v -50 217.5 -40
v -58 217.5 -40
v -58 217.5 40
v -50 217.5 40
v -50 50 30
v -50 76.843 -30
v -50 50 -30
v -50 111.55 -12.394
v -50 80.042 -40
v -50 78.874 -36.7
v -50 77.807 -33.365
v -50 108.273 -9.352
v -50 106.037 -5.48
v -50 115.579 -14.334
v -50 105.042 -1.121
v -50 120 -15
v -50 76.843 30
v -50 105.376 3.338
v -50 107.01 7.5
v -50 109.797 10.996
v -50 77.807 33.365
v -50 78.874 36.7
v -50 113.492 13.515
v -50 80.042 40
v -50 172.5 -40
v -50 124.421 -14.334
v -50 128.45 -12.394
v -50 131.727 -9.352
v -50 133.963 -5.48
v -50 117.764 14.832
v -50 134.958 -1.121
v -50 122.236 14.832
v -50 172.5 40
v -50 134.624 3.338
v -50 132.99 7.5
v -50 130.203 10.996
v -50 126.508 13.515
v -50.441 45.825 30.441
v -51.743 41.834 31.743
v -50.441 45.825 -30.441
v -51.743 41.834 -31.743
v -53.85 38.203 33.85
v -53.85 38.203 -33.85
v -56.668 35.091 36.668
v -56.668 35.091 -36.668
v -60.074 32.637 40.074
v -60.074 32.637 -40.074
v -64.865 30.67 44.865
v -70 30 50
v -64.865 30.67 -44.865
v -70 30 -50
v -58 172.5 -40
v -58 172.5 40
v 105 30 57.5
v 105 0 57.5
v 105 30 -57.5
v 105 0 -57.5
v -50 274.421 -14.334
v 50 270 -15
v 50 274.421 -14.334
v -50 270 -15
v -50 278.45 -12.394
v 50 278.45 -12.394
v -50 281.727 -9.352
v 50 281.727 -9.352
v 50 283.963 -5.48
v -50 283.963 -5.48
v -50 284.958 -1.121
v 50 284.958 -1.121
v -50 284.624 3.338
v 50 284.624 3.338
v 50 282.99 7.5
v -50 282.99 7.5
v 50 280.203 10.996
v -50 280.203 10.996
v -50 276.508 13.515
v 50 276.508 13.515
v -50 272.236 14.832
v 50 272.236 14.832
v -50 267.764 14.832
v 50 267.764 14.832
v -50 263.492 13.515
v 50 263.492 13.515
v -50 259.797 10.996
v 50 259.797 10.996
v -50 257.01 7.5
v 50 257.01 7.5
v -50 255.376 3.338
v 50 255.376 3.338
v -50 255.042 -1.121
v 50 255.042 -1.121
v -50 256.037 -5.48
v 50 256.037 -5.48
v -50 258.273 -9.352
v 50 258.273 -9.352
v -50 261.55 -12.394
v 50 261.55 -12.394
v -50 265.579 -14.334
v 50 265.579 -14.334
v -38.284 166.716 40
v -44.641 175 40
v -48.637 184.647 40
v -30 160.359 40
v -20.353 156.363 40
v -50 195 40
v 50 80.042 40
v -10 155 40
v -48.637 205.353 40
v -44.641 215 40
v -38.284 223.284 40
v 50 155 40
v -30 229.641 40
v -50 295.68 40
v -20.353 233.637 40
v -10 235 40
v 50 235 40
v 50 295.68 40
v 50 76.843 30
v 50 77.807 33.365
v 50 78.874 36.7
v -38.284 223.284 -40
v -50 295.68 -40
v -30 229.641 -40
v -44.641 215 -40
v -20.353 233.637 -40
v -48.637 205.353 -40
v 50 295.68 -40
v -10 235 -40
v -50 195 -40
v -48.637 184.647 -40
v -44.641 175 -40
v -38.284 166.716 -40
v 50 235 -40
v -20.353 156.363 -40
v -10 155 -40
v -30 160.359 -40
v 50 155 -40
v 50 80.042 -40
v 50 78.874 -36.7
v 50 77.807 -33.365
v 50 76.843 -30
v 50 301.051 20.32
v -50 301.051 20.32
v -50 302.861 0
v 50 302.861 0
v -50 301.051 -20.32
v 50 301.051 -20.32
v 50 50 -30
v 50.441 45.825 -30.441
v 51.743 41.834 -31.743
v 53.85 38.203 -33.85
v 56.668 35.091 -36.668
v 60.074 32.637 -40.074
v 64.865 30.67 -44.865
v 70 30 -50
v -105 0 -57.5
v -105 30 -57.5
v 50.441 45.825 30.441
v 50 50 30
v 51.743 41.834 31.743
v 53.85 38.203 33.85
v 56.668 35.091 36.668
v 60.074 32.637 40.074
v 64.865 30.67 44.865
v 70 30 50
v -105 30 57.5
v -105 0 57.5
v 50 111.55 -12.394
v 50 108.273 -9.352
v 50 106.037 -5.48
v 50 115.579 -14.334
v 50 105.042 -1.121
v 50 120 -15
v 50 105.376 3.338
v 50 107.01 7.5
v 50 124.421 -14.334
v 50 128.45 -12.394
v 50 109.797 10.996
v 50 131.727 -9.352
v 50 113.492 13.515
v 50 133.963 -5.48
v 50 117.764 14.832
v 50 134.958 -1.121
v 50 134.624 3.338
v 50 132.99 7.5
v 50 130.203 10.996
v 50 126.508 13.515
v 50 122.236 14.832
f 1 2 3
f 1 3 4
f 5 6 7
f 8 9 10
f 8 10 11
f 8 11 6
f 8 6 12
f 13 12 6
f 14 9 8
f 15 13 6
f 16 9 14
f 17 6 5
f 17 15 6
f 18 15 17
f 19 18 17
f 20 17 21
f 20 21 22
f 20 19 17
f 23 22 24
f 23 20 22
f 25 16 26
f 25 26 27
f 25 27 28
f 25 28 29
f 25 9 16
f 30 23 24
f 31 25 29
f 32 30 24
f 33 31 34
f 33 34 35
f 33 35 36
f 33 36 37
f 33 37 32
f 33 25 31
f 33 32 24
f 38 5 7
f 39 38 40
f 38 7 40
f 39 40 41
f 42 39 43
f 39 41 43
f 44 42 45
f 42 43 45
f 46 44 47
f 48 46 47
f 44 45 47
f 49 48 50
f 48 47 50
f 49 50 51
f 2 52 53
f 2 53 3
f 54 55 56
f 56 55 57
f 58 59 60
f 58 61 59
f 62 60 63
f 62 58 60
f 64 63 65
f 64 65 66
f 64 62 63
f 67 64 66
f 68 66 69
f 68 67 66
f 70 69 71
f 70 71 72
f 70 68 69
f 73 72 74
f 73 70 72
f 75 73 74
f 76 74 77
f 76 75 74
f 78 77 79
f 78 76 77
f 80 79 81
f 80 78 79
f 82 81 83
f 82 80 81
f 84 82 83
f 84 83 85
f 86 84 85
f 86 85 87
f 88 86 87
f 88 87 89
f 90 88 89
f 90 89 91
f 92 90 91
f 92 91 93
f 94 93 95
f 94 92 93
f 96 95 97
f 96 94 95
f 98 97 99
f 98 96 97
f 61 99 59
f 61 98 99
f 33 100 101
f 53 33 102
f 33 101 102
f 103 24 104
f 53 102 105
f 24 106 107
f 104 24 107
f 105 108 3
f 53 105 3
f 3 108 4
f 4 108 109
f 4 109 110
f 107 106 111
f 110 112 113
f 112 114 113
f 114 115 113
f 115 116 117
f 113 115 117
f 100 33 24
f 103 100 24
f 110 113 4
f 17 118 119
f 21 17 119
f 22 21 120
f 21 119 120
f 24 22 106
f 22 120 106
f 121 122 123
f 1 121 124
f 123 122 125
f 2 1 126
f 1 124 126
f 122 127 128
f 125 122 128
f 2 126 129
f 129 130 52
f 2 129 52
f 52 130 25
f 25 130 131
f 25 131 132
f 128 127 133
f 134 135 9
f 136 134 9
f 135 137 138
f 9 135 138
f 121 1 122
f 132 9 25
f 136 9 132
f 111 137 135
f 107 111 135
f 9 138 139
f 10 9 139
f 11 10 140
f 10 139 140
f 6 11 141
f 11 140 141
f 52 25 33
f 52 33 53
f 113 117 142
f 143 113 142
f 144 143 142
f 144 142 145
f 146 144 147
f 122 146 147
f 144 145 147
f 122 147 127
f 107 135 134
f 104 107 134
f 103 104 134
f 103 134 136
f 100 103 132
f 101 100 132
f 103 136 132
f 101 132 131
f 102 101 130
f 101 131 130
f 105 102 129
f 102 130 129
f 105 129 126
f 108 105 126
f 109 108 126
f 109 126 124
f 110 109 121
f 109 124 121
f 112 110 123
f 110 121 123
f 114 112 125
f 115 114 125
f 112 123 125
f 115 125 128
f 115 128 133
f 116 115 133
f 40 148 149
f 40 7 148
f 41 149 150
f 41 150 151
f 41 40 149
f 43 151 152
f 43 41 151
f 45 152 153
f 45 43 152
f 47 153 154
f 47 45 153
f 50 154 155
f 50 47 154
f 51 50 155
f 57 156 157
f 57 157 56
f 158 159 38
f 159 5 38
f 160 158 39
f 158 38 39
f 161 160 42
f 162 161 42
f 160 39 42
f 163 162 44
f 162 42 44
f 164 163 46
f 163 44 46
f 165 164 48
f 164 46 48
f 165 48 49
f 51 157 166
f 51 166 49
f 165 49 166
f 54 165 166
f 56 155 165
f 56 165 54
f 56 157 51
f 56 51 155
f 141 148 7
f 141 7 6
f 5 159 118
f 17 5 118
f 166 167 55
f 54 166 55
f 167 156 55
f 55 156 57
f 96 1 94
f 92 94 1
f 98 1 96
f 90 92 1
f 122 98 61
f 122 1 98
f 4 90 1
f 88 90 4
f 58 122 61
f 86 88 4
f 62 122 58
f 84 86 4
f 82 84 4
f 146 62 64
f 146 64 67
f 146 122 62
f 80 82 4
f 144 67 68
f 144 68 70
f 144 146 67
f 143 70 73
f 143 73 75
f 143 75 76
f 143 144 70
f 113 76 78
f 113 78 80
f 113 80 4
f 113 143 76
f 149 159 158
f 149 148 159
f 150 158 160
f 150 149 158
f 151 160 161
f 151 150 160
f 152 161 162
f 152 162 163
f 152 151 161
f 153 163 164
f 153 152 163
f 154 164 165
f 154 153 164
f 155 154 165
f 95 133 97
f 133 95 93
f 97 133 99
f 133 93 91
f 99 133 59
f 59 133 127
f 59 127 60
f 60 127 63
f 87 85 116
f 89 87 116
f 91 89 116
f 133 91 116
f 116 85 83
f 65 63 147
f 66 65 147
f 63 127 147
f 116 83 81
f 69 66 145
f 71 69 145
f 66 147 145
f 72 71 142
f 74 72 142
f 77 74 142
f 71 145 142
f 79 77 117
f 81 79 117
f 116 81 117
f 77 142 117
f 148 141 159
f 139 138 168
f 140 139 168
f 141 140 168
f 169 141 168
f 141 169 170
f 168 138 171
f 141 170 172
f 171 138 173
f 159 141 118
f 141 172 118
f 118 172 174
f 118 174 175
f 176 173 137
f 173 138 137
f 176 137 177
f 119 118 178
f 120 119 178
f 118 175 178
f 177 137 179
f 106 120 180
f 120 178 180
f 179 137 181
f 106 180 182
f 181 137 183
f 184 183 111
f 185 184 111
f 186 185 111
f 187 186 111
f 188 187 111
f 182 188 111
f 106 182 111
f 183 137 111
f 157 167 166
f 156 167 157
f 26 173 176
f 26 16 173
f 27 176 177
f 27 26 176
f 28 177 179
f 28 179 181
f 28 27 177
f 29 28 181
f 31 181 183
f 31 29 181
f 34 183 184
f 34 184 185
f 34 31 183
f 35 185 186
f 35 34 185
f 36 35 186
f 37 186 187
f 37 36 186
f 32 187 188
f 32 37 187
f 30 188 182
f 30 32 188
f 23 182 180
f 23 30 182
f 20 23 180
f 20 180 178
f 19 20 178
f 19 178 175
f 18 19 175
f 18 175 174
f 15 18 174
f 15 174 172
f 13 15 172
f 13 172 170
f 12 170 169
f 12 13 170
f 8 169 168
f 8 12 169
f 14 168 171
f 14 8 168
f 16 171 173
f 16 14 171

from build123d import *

# Parameters (mm, degrees)
SKETCH1_W           = 210
SKETCH1_H           = 115
BOSS_EXTRUDE2_DEPTH = 30
SKETCH6_W           = 60
SKETCH6_H           = 60
BOSS_EXTRUDE3_DEPTH = 50
SKETCH8_R           = 15
BOSS_EXTRUDE4_DEPTH = 50
FILLET1_R           = 20
BOSS_EXTRUDE5_DEPTH = 80
CUT_EXTRUDE1_DEPTH  = 336.046164359


with BuildPart() as part:
    # Sketch1 → Boss-Extrude2 (new body)
    with BuildSketch(Plane(origin=(0, 0, 0), x_dir=(1, 0, 0), z_dir=(0, 1, 0))):
        Rectangle(SKETCH1_W, SKETCH1_H)
    extrude(amount=BOSS_EXTRUDE2_DEPTH)

    # Sketch6 → Boss-Extrude3 (add, symmetric)
    with BuildSketch(Plane(origin=(0, 0, 0), x_dir=(0, 0, -1), z_dir=(1, 0, 0))):
        with Locations((0, 55.329200869)):
            Rectangle(SKETCH6_W, SKETCH6_H)
    extrude(amount=BOSS_EXTRUDE3_DEPTH, both=True)

    # Sketch8 → Boss-Extrude4 (add, symmetric)
    with BuildSketch(Plane(origin=(0, 0, 0), x_dir=(0, 0, -1), z_dir=(1, 0, 0))):
        with BuildLine():
            Line((40, 295.680123104), (40, 80.041536576))
            ThreePointArc((40, 80.041536576), (0, 72.86082984), (-40, 80.041536576))
            Line((-40, 80.041536576), (-40, 295.680123104))
            ThreePointArc((-40, 295.680123104), (0, 302.86082984), (40, 295.680123104))
        make_face()
        with Locations((0, 270)):
            Circle(SKETCH8_R, mode=Mode.SUBTRACT)
        with Locations((0, 120)):
            Circle(SKETCH8_R, mode=Mode.SUBTRACT)
    extrude(amount=BOSS_EXTRUDE4_DEPTH, both=True)

    # Fillet1
    fillet1_edges = [part.edges().sort_by_distance(p)[0] for p in [
        (-50, 30, 0),
        (0, 30, 30),
        (0, 30, -30),
        (50, 30, 0),
    ]]
    fillet(fillet1_edges, radius=FILLET1_R)

    # Sketch9 → Boss-Extrude5 (add)
    with BuildSketch(Plane(origin=(0, 0, -40), x_dir=(-1, 0, 0), z_dir=(0, 0, -1))):
        Polygon((58, 217.5), (50, 217.5), (50, 194.99999986), (50, 172.5), (58, 172.5), align=None)
    extrude(amount=-BOSS_EXTRUDE5_DEPTH)

    # Sketch9<3> → Cut-Extrude1 (cut, through all)
    with BuildSketch(Plane(origin=(0, 0, -40), x_dir=(-1, 0, 0), z_dir=(0, 0, -1))):
        with BuildLine():
            ThreePointArc((50, 194.999999634), (38.284271377, 223.284271118), (10, 235))
            Line((10, 235), (-50, 235))
            Line((-50, 235), (-50, 155))
            Line((-50, 155), (10, 155))
            ThreePointArc((10, 155), (38.284271118, 166.715728623), (50, 194.999999634))
        make_face()
    extrude(amount=-CUT_EXTRUDE1_DEPTH, mode=Mode.SUBTRACT)


solid = part.part
